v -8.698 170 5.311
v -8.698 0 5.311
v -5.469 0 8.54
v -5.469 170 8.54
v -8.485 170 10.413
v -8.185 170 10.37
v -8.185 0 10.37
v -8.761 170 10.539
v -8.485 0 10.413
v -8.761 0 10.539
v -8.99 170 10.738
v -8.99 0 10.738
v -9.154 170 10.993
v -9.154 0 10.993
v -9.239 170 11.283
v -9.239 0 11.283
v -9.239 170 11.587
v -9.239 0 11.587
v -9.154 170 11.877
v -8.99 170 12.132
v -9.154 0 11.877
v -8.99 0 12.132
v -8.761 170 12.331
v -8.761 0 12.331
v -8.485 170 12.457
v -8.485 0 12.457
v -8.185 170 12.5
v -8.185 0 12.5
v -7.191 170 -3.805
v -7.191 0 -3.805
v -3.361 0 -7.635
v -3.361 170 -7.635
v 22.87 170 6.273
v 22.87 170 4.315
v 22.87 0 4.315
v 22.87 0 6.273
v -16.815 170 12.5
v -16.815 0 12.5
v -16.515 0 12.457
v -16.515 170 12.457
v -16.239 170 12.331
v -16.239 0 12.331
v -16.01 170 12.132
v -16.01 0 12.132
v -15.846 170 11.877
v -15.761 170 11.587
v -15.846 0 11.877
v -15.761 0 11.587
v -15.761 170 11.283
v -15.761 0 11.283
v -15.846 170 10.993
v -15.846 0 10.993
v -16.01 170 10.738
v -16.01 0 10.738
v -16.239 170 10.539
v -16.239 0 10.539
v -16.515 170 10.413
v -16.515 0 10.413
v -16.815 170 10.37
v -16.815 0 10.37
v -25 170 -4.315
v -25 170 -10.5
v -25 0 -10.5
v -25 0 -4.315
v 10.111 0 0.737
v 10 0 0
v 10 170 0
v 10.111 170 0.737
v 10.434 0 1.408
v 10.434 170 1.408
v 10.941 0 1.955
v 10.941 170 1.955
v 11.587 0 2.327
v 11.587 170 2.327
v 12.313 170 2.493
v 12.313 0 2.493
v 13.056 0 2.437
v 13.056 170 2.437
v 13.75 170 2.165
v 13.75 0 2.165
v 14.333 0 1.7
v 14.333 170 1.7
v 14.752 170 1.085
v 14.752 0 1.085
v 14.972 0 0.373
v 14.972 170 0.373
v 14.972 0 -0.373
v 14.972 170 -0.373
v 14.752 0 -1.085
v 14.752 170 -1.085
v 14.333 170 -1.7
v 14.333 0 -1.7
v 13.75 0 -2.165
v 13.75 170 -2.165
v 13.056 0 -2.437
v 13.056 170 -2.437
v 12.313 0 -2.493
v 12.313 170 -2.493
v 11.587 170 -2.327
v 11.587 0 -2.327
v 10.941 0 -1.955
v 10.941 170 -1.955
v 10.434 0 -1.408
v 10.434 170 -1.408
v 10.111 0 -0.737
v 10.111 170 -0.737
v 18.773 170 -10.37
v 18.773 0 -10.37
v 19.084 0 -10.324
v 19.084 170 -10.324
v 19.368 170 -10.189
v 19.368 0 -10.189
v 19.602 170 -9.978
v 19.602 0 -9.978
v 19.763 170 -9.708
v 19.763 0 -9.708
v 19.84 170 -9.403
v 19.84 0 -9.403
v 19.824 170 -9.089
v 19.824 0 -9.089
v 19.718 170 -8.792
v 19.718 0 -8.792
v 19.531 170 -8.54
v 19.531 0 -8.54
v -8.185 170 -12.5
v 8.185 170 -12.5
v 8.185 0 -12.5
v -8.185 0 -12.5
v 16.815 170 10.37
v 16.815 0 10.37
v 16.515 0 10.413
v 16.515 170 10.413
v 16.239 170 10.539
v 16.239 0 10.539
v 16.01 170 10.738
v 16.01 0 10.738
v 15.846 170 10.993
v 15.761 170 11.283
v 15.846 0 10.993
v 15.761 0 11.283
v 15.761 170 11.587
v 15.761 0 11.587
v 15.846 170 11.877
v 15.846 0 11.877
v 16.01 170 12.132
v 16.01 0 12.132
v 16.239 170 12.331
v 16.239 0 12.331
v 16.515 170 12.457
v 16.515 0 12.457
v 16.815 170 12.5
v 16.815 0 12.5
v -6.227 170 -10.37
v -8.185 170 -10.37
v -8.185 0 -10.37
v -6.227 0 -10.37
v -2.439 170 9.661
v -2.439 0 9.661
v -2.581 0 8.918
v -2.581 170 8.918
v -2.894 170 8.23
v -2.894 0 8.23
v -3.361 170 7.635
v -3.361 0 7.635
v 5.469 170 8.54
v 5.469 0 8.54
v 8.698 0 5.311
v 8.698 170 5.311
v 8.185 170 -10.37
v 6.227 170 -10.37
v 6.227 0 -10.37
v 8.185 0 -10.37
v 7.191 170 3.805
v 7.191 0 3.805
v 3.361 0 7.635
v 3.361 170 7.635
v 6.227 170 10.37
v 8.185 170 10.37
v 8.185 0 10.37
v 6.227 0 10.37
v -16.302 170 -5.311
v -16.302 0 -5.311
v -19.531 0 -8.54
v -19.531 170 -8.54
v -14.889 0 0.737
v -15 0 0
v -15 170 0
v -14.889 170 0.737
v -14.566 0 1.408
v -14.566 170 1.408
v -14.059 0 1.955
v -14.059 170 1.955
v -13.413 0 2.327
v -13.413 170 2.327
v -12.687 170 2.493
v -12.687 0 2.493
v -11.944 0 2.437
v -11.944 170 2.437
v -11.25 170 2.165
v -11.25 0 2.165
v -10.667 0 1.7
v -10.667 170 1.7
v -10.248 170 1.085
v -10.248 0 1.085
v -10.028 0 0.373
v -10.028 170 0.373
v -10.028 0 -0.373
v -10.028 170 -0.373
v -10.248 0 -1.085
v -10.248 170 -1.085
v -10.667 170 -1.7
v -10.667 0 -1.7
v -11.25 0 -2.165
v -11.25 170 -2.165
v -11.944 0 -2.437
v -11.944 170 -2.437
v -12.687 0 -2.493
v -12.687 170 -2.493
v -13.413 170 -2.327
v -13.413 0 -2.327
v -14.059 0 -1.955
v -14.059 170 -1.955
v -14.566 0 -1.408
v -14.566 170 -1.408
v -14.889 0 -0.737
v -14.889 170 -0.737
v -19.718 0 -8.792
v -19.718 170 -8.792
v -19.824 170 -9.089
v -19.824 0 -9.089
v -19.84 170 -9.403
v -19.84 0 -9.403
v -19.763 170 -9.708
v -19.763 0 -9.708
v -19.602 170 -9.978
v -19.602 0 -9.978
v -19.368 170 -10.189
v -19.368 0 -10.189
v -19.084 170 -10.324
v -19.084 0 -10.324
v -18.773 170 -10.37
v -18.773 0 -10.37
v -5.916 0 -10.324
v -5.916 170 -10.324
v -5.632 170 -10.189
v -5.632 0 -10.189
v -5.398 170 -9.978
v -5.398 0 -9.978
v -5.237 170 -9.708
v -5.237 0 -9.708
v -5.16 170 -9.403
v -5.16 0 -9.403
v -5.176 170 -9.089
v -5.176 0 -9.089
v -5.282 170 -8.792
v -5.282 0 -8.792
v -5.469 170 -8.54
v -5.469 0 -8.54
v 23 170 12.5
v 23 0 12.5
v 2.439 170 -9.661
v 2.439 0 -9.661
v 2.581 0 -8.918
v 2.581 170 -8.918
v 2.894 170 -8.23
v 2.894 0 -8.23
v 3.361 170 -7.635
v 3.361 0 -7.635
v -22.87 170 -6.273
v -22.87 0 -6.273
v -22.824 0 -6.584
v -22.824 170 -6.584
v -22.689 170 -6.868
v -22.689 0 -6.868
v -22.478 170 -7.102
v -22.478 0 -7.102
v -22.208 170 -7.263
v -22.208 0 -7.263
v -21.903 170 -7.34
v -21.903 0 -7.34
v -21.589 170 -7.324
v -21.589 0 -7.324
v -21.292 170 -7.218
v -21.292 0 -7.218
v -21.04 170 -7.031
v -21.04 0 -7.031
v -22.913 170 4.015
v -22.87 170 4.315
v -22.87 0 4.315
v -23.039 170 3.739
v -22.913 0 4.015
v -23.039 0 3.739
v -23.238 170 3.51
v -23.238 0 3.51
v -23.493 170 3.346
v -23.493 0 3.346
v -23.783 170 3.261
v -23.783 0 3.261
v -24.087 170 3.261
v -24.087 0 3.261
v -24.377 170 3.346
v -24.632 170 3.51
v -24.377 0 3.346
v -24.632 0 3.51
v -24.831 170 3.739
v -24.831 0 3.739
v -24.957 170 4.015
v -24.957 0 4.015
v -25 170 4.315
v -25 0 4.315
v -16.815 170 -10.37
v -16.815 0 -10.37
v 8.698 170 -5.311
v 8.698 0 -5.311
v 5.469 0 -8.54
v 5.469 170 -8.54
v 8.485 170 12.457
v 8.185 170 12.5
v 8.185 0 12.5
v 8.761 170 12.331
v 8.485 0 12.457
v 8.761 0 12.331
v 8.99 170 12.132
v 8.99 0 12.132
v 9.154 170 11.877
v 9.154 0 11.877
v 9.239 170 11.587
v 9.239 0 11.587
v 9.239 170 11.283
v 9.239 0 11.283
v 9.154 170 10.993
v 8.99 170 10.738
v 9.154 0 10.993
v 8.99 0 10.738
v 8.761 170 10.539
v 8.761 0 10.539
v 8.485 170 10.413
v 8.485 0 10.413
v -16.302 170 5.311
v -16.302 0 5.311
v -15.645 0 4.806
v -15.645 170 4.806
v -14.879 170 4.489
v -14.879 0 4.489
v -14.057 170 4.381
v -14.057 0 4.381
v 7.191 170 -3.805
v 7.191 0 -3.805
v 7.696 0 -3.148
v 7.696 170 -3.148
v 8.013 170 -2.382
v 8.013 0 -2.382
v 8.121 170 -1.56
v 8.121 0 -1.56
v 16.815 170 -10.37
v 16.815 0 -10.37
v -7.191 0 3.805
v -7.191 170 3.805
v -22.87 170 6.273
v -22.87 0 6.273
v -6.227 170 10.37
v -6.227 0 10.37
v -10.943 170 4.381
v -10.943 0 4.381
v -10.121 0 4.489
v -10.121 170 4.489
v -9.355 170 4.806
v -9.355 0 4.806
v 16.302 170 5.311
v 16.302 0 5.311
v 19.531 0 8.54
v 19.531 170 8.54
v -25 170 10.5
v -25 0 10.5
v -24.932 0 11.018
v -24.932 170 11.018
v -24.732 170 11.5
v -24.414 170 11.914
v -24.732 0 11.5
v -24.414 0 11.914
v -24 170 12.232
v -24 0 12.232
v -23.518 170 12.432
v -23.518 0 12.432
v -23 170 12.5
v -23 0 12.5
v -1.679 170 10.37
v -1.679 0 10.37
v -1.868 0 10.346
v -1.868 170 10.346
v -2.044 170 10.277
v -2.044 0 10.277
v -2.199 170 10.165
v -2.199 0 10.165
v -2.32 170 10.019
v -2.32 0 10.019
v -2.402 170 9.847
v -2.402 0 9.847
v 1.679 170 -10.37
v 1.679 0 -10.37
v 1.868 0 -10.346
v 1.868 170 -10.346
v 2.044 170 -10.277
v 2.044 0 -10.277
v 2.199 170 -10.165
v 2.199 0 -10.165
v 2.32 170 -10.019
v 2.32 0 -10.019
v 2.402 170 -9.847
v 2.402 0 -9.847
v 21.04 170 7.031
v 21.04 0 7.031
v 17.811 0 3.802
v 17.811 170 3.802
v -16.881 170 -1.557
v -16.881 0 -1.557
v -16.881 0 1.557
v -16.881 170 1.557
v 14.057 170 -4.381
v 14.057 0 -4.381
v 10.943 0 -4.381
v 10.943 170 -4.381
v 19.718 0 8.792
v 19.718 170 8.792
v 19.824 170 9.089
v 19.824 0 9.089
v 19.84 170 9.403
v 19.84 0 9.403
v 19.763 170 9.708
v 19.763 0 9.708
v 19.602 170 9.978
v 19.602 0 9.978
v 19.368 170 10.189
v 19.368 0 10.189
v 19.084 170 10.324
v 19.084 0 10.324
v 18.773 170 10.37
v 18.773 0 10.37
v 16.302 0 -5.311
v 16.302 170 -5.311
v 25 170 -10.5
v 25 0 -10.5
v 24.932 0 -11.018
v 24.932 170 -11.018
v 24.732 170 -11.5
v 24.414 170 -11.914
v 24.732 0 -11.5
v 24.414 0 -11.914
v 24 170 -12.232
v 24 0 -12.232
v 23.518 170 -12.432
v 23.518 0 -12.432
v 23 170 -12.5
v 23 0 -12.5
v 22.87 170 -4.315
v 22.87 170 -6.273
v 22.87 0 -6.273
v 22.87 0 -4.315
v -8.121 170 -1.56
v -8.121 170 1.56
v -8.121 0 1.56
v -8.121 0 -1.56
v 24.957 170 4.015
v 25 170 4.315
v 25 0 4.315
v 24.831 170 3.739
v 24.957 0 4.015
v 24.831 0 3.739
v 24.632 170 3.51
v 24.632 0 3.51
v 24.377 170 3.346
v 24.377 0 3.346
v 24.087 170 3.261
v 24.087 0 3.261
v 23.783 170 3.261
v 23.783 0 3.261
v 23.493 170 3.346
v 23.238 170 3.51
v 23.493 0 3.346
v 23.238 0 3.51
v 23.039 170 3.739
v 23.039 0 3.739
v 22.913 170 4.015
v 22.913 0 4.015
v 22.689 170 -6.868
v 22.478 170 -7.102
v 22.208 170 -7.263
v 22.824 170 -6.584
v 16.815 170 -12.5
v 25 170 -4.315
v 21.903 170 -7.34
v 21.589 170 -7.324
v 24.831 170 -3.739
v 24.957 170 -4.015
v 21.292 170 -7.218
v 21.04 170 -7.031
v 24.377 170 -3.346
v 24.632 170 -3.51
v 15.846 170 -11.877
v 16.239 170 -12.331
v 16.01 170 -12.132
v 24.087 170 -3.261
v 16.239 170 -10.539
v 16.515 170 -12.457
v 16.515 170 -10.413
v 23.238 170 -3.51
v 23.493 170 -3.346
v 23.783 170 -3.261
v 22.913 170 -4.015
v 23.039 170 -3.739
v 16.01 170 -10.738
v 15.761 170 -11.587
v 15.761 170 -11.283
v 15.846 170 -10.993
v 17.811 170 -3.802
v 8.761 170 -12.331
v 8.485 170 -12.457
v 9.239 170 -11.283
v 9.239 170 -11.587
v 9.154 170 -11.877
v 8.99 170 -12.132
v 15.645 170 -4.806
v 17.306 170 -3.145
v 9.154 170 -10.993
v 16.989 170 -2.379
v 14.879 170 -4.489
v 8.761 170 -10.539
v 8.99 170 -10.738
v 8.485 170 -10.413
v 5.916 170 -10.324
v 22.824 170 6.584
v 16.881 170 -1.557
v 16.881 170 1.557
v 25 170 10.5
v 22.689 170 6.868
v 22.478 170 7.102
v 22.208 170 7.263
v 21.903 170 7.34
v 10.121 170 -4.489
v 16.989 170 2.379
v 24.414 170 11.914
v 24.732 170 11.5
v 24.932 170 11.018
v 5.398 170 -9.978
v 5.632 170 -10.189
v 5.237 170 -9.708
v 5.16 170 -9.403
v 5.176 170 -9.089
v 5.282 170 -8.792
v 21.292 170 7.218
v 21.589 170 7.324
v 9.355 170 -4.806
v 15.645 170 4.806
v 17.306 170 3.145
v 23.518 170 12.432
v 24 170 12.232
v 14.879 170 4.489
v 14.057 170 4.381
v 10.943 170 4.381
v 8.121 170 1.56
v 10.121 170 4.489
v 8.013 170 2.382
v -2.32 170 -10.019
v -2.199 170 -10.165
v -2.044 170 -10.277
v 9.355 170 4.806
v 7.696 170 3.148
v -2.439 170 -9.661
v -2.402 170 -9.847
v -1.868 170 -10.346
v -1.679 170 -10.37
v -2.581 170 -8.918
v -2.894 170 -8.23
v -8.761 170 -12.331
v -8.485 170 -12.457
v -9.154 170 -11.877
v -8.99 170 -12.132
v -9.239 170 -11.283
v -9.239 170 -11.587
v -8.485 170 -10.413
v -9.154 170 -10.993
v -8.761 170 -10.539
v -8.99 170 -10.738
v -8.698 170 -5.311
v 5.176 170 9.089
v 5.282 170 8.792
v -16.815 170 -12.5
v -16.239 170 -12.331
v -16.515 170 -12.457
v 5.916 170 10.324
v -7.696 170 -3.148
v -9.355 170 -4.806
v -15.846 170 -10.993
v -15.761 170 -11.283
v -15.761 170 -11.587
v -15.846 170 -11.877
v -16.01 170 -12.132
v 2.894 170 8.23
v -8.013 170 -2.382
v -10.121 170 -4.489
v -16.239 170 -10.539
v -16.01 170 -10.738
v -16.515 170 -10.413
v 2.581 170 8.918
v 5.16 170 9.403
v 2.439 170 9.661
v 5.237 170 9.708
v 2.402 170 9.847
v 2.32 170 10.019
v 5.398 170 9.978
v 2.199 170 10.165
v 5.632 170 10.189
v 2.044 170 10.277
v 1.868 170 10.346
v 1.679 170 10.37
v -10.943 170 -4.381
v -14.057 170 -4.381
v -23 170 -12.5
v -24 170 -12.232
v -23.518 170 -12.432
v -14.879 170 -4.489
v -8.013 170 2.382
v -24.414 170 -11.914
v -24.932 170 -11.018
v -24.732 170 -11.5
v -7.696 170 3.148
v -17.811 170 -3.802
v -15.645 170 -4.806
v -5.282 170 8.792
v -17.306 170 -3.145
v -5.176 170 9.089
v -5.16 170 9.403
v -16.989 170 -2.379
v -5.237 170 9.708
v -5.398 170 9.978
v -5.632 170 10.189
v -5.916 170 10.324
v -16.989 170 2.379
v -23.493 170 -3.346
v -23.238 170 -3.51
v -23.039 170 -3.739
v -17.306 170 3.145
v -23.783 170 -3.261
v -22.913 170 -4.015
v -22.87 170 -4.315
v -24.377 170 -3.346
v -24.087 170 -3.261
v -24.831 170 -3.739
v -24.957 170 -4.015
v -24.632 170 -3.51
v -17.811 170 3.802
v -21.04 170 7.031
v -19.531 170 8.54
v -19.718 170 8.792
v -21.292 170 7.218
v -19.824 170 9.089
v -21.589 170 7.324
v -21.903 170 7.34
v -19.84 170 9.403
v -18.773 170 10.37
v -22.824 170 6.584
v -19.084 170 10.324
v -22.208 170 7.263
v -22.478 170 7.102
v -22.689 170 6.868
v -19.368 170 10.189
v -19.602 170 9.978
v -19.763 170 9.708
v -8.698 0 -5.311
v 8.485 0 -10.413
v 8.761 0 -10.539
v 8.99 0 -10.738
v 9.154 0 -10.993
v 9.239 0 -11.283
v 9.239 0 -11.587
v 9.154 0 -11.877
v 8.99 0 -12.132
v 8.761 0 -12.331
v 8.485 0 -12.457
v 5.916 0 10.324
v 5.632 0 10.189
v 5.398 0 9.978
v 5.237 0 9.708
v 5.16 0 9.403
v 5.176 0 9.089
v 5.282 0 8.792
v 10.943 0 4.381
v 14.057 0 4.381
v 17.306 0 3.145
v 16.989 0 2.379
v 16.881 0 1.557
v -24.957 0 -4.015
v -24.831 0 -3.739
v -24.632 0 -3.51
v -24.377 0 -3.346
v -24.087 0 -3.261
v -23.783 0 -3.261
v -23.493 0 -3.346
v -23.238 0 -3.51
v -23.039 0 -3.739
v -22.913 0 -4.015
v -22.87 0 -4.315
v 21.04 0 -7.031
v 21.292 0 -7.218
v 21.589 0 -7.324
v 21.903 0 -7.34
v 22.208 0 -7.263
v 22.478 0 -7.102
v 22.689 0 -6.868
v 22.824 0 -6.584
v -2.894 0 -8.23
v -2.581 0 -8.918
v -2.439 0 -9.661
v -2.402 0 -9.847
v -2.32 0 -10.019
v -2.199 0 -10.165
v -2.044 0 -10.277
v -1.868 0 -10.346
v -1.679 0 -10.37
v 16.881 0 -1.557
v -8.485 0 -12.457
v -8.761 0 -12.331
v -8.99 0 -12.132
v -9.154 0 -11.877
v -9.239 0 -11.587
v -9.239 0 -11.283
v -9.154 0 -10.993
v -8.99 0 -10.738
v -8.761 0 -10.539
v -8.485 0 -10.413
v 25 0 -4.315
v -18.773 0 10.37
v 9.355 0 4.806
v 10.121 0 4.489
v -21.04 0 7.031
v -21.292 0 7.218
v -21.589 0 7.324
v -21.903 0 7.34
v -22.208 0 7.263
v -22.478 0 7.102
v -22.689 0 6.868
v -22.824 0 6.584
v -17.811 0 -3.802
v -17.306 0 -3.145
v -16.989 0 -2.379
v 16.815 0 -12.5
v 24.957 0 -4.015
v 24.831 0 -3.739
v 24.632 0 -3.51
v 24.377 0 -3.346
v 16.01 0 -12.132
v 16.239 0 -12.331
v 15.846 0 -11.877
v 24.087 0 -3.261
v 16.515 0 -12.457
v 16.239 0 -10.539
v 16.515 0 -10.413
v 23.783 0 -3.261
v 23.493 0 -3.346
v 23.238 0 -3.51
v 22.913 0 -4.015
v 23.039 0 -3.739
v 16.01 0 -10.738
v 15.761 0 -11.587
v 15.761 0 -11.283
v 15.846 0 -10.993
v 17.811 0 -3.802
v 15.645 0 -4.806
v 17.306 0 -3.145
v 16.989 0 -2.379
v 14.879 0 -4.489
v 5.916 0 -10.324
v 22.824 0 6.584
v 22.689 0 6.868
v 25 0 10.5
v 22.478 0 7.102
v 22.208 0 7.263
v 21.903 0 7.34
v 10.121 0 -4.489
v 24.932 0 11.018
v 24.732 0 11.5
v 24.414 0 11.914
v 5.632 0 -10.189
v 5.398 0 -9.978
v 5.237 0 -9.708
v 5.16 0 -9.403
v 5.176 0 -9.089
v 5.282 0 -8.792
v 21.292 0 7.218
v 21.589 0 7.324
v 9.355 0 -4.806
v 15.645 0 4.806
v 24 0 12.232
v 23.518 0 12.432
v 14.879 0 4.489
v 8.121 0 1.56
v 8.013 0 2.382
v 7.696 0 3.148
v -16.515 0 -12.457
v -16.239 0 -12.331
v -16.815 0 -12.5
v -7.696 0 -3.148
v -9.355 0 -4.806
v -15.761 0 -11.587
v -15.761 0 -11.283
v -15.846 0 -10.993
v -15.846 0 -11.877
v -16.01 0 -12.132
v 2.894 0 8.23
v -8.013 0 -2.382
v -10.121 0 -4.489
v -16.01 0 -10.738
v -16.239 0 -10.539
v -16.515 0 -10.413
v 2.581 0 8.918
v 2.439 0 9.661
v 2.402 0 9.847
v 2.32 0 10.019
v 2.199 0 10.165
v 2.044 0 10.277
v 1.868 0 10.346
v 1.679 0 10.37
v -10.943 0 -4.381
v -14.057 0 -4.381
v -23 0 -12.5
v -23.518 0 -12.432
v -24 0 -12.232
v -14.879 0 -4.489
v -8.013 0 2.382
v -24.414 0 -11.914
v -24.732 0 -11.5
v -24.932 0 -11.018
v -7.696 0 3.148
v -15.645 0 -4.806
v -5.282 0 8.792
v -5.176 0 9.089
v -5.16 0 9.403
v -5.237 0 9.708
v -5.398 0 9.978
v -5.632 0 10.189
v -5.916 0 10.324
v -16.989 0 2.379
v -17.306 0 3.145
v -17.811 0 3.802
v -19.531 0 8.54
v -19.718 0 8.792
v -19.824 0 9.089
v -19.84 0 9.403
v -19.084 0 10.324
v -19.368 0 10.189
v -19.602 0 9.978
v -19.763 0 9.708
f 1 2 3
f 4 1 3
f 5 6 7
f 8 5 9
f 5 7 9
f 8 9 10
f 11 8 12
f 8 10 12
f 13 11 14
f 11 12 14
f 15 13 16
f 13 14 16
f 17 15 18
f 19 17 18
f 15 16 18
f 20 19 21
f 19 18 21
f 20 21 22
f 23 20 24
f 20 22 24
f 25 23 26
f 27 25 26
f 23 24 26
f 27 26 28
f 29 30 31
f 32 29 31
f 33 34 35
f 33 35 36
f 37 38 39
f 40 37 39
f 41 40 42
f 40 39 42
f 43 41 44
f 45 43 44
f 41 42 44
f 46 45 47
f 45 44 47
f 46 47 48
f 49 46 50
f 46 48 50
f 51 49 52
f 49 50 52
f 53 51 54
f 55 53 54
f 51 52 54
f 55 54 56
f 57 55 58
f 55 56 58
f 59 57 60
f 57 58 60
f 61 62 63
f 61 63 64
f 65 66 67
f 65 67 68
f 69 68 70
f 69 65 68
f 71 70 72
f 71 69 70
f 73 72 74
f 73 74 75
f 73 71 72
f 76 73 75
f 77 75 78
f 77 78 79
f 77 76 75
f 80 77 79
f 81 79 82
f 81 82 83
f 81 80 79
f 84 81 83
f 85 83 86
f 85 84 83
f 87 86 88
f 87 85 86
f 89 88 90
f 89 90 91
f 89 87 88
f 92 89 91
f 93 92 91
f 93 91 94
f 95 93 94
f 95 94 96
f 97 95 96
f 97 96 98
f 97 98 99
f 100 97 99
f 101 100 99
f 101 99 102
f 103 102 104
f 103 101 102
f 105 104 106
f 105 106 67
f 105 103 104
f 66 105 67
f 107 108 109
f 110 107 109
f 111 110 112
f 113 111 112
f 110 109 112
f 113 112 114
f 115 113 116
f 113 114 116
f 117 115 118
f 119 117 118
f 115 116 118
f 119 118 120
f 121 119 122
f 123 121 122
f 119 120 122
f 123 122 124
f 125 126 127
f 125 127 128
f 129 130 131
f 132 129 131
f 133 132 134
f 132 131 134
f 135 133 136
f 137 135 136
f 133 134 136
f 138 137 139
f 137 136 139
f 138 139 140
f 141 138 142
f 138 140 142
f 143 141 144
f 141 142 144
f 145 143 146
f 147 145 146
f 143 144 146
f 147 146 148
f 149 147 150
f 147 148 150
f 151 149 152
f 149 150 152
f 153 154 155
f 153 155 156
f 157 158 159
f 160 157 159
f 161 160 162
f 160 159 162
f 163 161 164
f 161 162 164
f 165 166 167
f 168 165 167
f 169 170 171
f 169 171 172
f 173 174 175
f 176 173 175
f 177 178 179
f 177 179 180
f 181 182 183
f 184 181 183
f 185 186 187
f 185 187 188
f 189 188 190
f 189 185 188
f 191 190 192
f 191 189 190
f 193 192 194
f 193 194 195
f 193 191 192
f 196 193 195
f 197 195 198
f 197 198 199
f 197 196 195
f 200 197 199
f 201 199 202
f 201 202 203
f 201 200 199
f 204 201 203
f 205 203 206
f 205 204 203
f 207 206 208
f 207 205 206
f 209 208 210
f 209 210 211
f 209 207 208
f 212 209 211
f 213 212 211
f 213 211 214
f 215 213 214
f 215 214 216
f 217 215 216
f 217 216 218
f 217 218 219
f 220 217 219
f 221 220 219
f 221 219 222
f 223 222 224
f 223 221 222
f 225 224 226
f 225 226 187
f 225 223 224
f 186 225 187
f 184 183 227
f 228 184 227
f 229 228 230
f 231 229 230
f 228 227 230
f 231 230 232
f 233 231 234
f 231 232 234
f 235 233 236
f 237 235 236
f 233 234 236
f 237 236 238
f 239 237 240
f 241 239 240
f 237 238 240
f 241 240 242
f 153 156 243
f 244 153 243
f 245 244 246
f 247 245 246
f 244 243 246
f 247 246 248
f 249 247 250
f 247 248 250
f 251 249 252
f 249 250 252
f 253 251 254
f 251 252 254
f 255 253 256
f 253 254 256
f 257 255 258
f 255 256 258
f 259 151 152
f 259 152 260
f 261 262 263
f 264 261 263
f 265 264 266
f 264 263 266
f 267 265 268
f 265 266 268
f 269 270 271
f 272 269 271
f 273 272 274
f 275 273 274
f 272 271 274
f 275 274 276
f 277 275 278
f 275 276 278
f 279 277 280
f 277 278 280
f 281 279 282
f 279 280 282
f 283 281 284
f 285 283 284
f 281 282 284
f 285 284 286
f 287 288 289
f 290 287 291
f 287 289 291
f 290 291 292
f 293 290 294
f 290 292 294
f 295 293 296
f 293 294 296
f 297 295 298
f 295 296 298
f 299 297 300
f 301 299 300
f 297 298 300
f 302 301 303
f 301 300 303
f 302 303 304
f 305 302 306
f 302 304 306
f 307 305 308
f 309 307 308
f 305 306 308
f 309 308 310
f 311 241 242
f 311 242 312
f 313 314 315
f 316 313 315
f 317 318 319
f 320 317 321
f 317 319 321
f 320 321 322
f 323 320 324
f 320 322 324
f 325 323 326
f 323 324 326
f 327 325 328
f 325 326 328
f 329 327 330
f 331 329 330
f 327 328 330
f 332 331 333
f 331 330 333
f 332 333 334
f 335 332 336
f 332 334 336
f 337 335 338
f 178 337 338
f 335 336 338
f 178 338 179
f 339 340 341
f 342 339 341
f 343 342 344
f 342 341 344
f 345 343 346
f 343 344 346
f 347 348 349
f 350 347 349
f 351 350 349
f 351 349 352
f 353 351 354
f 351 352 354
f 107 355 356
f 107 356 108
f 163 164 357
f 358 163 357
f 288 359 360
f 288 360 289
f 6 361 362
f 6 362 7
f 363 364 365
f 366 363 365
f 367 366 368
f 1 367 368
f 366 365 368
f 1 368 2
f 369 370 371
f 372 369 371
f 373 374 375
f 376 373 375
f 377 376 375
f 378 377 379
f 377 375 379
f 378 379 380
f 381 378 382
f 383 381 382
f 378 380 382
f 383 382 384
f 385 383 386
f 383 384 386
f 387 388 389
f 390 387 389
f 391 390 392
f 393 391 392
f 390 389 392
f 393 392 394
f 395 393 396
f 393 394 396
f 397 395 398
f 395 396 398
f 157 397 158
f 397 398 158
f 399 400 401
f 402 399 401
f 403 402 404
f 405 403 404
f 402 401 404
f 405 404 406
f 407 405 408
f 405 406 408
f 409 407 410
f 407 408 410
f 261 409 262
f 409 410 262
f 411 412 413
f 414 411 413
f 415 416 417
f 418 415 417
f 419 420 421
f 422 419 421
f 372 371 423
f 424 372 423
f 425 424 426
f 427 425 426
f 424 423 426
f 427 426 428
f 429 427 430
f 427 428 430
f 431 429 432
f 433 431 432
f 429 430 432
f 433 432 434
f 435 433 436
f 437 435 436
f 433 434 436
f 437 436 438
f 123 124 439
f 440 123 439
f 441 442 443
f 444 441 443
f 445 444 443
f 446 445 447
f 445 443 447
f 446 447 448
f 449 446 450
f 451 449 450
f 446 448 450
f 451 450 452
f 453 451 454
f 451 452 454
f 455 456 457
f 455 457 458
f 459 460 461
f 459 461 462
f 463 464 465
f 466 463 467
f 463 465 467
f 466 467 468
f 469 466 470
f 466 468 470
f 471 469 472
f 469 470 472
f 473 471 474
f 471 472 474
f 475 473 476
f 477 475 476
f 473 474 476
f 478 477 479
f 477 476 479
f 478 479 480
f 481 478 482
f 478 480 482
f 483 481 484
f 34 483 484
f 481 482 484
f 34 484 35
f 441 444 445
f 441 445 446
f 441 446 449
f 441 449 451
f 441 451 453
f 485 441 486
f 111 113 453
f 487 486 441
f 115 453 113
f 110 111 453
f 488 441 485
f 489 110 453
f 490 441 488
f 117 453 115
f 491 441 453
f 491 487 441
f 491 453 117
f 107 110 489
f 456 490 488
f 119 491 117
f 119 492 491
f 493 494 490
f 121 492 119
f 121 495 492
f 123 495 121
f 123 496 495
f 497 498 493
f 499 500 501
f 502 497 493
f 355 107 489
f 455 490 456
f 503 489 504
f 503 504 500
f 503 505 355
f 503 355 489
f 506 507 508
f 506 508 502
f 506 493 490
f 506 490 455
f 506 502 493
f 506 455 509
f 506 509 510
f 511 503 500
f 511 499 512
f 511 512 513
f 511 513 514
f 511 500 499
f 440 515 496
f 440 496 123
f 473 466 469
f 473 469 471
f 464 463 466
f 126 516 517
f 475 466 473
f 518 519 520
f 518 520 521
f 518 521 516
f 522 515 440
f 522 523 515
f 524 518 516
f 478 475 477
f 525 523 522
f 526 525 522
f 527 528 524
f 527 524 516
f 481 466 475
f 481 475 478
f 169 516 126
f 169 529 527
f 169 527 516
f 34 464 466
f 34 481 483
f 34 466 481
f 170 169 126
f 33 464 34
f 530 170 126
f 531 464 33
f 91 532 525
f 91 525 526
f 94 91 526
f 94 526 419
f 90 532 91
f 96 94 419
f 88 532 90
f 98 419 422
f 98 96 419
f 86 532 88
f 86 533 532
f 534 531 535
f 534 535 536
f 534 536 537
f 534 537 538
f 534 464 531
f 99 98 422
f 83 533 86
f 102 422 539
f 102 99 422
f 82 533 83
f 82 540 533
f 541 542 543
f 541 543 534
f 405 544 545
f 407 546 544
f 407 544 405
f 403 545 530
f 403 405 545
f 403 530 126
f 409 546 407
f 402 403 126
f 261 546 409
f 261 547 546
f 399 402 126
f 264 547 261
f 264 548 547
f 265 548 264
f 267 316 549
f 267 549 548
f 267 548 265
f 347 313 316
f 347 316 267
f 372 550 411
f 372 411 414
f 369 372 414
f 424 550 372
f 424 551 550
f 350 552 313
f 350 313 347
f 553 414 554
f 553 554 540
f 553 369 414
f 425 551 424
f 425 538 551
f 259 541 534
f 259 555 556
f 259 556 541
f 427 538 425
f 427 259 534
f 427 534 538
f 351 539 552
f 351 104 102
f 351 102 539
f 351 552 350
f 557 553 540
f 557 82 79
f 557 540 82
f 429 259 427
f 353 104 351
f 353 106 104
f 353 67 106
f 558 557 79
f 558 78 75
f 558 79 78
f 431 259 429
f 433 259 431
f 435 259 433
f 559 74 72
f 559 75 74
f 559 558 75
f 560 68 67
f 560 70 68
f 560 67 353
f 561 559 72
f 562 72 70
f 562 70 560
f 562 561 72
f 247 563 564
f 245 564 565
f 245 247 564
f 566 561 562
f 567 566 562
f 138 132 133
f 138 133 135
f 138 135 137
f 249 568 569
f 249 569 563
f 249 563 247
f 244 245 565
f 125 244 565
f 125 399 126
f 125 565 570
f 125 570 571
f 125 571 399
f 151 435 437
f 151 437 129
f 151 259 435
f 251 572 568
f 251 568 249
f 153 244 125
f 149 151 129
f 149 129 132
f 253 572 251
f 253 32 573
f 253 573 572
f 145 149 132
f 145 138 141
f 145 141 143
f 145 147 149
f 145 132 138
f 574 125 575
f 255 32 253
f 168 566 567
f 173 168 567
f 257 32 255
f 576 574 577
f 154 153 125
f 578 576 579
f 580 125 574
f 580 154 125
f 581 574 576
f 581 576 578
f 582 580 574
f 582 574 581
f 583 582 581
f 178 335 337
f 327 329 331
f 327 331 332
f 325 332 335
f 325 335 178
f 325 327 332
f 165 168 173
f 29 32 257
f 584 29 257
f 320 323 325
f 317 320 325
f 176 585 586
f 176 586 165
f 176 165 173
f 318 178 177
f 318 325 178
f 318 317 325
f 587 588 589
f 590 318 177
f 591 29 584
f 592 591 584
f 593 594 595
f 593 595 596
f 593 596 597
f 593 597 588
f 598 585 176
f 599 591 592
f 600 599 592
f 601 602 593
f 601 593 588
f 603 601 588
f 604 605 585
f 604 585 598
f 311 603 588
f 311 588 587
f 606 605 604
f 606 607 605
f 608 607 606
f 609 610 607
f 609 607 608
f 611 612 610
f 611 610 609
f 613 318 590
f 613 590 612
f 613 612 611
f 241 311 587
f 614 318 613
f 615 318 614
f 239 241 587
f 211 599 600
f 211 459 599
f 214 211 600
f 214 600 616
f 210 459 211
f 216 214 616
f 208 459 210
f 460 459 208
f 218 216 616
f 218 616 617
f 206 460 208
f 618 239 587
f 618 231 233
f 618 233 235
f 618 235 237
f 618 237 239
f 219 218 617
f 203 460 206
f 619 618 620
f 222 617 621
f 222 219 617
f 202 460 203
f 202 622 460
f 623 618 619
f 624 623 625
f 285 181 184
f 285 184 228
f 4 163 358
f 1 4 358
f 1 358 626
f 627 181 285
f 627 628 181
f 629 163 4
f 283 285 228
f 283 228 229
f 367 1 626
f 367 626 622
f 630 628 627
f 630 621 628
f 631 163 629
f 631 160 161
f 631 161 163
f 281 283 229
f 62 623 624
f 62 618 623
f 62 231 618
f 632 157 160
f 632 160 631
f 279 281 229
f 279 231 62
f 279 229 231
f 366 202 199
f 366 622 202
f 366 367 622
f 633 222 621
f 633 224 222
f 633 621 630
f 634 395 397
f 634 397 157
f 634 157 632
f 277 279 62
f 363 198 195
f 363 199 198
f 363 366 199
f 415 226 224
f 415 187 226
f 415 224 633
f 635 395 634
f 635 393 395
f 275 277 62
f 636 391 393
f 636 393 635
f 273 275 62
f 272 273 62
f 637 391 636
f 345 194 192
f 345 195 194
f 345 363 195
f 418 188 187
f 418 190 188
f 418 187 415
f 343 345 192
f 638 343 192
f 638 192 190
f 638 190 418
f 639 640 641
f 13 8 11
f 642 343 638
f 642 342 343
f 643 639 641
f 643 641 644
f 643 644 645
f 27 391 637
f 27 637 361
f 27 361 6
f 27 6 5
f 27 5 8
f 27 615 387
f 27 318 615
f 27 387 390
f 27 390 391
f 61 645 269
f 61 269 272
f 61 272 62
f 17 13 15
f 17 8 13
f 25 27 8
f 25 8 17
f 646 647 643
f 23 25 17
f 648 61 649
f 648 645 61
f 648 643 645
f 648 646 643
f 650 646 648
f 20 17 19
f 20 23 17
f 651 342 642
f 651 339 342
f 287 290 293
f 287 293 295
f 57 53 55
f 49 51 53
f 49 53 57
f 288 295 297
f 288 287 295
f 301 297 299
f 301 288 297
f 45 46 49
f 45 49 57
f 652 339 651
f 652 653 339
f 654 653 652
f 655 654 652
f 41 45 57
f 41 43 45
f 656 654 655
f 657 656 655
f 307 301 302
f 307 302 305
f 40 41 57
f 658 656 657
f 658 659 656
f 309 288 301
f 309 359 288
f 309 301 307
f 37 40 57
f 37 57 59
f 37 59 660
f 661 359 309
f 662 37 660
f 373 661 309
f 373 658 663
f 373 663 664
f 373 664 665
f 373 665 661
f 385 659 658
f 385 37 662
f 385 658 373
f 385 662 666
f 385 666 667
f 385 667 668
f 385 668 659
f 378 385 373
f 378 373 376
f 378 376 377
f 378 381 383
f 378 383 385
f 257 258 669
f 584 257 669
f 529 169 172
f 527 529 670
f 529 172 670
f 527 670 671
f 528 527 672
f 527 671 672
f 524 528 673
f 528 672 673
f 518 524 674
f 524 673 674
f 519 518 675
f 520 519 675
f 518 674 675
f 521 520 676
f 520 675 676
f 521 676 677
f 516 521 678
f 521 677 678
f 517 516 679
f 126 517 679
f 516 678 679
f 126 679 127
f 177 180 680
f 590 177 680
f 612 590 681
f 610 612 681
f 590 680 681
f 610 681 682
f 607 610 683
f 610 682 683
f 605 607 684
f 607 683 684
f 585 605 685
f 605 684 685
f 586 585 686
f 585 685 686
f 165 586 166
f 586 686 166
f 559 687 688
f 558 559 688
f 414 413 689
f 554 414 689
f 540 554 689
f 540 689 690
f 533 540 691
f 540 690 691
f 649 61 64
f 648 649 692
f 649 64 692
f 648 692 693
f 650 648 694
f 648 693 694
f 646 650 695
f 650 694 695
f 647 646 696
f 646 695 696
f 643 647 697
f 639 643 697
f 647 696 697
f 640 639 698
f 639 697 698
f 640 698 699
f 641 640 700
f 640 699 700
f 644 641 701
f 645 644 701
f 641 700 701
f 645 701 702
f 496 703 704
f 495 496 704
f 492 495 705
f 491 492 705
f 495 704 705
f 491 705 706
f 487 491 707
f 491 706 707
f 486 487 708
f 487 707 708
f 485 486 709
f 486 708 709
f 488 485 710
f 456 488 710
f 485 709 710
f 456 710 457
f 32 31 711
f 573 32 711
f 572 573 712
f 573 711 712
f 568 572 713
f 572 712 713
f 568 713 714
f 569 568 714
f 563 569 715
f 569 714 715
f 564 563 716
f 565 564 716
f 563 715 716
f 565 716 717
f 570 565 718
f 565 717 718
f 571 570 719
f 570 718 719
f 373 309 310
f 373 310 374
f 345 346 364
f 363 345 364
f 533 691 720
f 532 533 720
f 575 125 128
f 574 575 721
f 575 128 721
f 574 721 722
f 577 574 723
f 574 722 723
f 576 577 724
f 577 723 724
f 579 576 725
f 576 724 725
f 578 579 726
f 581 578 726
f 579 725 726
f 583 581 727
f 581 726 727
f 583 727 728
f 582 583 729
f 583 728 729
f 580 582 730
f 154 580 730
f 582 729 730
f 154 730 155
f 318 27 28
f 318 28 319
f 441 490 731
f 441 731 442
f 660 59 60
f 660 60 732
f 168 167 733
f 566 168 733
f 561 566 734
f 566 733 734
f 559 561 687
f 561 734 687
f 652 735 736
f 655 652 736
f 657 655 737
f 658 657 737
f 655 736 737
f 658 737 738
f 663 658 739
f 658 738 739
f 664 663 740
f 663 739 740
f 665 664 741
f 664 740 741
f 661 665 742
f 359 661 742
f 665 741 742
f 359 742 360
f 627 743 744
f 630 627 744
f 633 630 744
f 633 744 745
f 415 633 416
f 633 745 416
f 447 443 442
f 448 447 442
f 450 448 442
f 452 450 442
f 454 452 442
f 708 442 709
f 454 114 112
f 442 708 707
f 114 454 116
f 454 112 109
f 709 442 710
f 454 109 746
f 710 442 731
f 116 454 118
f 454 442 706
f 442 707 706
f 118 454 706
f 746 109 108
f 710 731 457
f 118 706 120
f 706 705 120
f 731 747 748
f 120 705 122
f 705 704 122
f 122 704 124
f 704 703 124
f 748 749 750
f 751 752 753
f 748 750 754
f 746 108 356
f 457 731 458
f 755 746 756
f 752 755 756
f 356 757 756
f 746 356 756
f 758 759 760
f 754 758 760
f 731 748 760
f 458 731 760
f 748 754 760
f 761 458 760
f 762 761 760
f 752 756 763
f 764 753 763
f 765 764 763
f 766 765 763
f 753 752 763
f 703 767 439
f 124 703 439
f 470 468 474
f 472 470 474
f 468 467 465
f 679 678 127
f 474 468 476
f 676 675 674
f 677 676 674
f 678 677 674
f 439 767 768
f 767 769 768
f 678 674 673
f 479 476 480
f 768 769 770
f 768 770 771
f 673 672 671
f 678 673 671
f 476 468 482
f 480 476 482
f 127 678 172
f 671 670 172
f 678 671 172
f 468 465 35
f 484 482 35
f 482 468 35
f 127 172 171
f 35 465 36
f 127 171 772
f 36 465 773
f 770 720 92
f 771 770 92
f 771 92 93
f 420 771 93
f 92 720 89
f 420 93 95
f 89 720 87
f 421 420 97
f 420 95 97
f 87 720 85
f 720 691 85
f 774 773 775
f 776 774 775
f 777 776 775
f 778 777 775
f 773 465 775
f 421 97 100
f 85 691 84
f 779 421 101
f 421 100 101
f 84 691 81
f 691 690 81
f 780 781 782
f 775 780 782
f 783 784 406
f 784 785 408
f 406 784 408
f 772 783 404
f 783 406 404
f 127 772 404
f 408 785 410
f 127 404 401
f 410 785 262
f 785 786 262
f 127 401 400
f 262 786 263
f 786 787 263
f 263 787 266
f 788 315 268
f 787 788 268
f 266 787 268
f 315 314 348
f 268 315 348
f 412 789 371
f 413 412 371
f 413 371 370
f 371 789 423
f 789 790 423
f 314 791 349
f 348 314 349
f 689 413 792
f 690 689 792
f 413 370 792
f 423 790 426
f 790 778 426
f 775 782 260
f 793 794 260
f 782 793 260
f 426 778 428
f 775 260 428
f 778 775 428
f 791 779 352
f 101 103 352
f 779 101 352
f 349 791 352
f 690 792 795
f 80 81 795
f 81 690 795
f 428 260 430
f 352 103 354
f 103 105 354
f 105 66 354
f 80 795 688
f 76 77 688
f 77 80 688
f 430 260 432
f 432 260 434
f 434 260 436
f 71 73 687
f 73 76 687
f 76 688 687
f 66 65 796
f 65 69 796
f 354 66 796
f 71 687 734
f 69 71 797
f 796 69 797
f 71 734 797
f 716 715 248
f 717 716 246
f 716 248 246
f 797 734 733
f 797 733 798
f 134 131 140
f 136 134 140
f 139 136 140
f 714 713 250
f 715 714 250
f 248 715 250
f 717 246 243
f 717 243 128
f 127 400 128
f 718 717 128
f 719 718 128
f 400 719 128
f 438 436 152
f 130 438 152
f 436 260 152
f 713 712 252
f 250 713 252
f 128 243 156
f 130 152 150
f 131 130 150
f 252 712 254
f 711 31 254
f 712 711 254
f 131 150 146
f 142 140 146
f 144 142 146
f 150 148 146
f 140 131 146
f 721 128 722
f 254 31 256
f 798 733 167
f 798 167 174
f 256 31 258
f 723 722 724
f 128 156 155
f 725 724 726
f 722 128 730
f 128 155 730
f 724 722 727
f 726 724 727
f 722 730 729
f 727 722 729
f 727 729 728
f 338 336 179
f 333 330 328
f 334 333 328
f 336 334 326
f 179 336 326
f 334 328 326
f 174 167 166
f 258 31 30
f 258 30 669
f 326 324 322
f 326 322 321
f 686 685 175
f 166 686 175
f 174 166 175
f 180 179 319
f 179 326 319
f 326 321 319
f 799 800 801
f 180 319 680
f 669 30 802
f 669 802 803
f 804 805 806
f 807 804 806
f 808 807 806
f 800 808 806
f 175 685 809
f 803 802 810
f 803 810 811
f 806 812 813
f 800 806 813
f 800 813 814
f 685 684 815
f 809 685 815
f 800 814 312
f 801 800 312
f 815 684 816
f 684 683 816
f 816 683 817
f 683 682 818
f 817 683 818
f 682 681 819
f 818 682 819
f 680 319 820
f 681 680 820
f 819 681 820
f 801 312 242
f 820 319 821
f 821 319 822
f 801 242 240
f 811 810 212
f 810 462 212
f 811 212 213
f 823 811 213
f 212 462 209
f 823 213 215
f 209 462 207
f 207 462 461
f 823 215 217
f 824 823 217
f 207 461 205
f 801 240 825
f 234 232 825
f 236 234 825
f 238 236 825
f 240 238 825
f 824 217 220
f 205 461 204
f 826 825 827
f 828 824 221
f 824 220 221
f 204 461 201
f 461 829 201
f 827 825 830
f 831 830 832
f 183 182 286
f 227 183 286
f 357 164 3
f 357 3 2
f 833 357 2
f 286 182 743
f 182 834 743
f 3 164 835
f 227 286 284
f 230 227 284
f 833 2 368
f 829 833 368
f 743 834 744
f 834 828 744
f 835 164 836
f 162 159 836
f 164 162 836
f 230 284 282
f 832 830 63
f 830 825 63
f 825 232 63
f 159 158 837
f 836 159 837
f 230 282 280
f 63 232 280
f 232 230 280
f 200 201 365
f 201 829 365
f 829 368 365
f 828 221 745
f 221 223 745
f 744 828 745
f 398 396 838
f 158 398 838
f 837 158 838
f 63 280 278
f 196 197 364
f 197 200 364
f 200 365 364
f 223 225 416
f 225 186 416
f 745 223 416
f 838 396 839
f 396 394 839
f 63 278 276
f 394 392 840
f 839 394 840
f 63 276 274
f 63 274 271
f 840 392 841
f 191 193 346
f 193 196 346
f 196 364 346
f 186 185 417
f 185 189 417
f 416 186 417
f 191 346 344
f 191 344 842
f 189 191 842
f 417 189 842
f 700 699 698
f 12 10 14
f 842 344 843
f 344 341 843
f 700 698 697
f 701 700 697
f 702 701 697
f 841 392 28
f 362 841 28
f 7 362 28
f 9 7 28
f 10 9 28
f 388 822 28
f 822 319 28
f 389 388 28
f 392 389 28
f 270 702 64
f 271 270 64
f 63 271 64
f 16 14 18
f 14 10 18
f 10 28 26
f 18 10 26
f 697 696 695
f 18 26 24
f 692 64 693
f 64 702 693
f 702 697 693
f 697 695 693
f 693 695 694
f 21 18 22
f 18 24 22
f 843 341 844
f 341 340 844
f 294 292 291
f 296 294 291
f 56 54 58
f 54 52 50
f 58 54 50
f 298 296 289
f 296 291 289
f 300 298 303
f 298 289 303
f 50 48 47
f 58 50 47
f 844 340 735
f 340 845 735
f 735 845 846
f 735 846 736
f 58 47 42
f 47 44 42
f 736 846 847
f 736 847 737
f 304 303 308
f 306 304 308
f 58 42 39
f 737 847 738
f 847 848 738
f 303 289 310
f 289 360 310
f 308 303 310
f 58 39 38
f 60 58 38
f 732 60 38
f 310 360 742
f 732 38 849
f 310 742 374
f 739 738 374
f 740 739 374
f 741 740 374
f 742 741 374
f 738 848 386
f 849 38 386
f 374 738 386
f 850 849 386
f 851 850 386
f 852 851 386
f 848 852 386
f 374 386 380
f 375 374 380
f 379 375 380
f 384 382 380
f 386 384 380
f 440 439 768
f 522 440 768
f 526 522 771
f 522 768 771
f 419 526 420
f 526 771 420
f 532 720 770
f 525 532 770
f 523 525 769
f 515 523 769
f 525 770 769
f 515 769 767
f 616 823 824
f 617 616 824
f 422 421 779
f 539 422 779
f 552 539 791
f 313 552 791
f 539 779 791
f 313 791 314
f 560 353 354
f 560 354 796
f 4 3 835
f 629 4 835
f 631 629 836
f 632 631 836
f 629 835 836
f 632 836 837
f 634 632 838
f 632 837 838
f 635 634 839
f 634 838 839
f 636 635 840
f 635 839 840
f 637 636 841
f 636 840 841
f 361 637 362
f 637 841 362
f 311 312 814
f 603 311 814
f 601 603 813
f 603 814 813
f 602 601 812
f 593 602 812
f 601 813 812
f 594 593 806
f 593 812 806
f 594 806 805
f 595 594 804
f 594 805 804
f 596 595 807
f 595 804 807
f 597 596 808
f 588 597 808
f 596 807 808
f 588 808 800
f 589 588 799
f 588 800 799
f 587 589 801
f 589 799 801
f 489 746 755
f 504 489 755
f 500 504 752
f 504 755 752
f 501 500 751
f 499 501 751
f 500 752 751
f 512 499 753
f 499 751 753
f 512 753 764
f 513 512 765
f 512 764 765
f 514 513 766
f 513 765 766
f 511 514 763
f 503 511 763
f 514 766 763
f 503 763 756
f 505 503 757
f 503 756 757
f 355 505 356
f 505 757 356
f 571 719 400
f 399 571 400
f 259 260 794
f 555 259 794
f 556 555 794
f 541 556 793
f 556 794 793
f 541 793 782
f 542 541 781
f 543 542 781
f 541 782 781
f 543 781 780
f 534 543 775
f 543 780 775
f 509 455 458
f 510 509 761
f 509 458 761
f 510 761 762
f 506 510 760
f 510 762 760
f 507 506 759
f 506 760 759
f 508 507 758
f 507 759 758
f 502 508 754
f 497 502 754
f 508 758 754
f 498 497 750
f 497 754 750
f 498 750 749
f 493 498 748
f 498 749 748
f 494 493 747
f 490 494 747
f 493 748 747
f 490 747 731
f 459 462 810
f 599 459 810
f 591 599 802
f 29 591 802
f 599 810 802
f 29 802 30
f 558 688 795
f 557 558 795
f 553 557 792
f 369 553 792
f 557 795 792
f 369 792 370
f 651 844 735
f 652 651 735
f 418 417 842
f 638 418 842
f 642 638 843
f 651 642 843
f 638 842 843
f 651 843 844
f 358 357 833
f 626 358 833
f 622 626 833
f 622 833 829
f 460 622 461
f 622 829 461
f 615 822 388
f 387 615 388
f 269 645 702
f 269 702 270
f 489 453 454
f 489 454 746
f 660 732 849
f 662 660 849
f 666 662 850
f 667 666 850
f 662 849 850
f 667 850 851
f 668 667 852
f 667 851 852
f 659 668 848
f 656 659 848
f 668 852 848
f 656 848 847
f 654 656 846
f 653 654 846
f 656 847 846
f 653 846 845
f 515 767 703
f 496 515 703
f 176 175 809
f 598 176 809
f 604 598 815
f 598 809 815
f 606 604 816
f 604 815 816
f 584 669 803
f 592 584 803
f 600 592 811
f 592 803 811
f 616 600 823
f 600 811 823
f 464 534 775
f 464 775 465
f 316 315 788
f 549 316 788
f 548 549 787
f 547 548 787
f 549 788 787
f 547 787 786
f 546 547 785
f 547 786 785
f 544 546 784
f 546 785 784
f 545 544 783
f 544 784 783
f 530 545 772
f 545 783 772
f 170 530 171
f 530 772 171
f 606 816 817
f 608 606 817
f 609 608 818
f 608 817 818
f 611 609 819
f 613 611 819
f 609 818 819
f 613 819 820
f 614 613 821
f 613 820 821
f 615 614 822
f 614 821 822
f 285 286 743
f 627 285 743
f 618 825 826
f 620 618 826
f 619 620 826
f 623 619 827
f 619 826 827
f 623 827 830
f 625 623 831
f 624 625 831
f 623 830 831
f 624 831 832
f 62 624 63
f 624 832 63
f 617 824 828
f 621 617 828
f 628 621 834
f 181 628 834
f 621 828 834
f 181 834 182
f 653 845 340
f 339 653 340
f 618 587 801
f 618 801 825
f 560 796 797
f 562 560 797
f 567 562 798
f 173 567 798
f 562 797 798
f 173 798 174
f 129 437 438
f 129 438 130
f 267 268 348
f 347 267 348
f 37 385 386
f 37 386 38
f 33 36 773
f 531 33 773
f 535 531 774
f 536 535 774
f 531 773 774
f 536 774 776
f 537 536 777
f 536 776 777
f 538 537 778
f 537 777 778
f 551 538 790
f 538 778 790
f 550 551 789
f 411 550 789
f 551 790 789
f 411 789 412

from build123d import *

# Parameters (mm, degrees)
SKETCH11_R                             = 2.5
F_25_SERIES_EXTRUSIONS_25_2550_1_DEPTH = 170


with BuildPart() as part:
    # Sketch11 → 25 series extrusions 25-2550(1) (new body)
    with BuildSketch(Plane(origin=(0, 0, 0), x_dir=(-1, 0, 0), z_dir=(0, 1, 0))):
        with BuildLine():
            Line((8.185, 12.5), (-8.185, 12.5))
            ThreePointArc((-8.185, 12.5), (-9.25, 11.435), (-8.185, 10.37))
            Line((-8.185, 10.37), (-6.227198013, 10.37))
            ThreePointArc((-6.227198013, 10.37), (-5.236616214, 9.708114403), (-5.469039527, 8.539643501))
            Line((-5.469039527, 8.539643501), (-8.697639148, 5.311043881))
            ThreePointArc((-8.697639148, 5.311043881), (-9.72768328, 4.622790395), (-10.942703178, 4.381107911))
            Line((-10.942703178, 4.381107911), (-14.057296822, 4.381107911))
            ThreePointArc((-14.057296822, 4.381107911), (-15.27231672, 4.622790395), (-16.302360852, 5.311043881))
            Line((-16.302360852, 5.311043881), (-19.530960473, 8.539643501))
            ThreePointArc((-19.530960473, 8.539643501), (-19.763383786, 9.708114403), (-18.772801987, 10.37))
            Line((-18.772801987, 10.37), (-16.815, 10.37))
            ThreePointArc((-16.815, 10.37), (-15.75, 11.435), (-16.815, 12.5))
            Line((-16.815, 12.5), (-23, 12.5))
            ThreePointArc((-23, 12.5), (-24.414213562, 11.914213562), (-25, 10.5))
            Line((-25, 10.5), (-25, 4.315))
            ThreePointArc((-25, 4.315), (-23.935, 3.25), (-22.87, 4.315))
            Line((-22.87, 4.315), (-22.87, 6.272801987))
            ThreePointArc((-22.87, 6.272801987), (-22.208114403, 7.263383786), (-21.039643501, 7.030960473))
            Line((-21.039643501, 7.030960473), (-17.811043881, 3.802360852))
            ThreePointArc((-17.811043881, 3.802360852), (-17.122790395, 2.77231672), (-16.881107911, 1.557296822))
            Line((-16.881107911, 1.557296822), (-16.881107911, -1.557296822))
            ThreePointArc((-16.881107911, -1.557296822), (-17.122790395, -2.77231672), (-17.811043881, -3.802360852))
            Line((-17.811043881, -3.802360852), (-21.039643501, -7.030960473))
            ThreePointArc((-21.039643501, -7.030960473), (-22.208114403, -7.263383786), (-22.87, -6.272801987))
            Line((-22.87, -6.272801987), (-22.87, -4.315))
            ThreePointArc((-22.87, -4.315), (-23.935, -3.25), (-25, -4.315))
            Line((-25, -4.315), (-25, -10.5))
            ThreePointArc((-25, -10.5), (-24.414213562, -11.914213562), (-23, -12.5))
            Line((-23, -12.5), (-16.815, -12.5))
            ThreePointArc((-16.815, -12.5), (-15.75, -11.435), (-16.815, -10.37))
            Line((-16.815, -10.37), (-18.772801987, -10.37))
            ThreePointArc((-18.772801987, -10.37), (-19.763383786, -9.708114403), (-19.530960473, -8.539643501))
            Line((-19.530960473, -8.539643501), (-16.302360852, -5.311043881))
            ThreePointArc((-16.302360852, -5.311043881), (-15.27231672, -4.622790395), (-14.057296822, -4.381107911))
            Line((-14.057296822, -4.381107911), (-10.942703178, -4.381107911))
            ThreePointArc((-10.942703178, -4.381107911), (-9.72768328, -4.622790395), (-8.697639148, -5.311043881))
            Line((-8.697639148, -5.311043881), (-5.469039527, -8.539643501))
            ThreePointArc((-5.469039527, -8.539643501), (-5.236616214, -9.708114403), (-6.227198013, -10.37))
            Line((-6.227198013, -10.37), (-8.185, -10.37))
            ThreePointArc((-8.185, -10.37), (-9.25, -11.435), (-8.185, -12.5))
            Line((-8.185, -12.5), (8.185, -12.5))
            ThreePointArc((8.185, -12.5), (9.25, -11.435), (8.185, -10.37))
            Line((8.185, -10.37), (6.227198013, -10.37))
            ThreePointArc((6.227198013, -10.37), (5.236616214, -9.708114403), (5.469039527, -8.539643501))
            Line((5.469039527, -8.539643501), (8.697639148, -5.311043881))
            ThreePointArc((8.697639148, -5.311043881), (9.72768328, -4.622790395), (10.942703178, -4.381107911))
            Line((10.942703178, -4.381107911), (14.057296822, -4.381107911))
            ThreePointArc((14.057296822, -4.381107911), (15.27231672, -4.622790395), (16.302360852, -5.311043881))
            Line((16.302360852, -5.311043881), (19.530960473, -8.539643501))
            ThreePointArc((19.530960473, -8.539643501), (19.763383786, -9.708114403), (18.772801987, -10.37))
            Line((18.772801987, -10.37), (16.815, -10.37))
            ThreePointArc((16.815, -10.37), (15.75, -11.435), (16.815, -12.5))
            Line((16.815, -12.5), (23, -12.5))
            ThreePointArc((23, -12.5), (24.414213562, -11.914213562), (25, -10.5))
            Line((25, -10.5), (25, -4.315))
            ThreePointArc((25, -4.315), (23.935, -3.25), (22.87, -4.315))
            Line((22.87, -4.315), (22.87, -6.272801987))
            ThreePointArc((22.87, -6.272801987), (22.208114403, -7.263383786), (21.039643501, -7.030960473))
            Line((21.039643501, -7.030960473), (17.811043881, -3.802360852))
            ThreePointArc((17.811043881, -3.802360852), (17.122790395, -2.77231672), (16.881107911, -1.557296822))
            Line((16.881107911, -1.557296822), (16.881107911, 1.557296822))
            ThreePointArc((16.881107911, 1.557296822), (17.122790395, 2.77231672), (17.811043881, 3.802360852))
            Line((17.811043881, 3.802360852), (21.039643501, 7.030960473))
            ThreePointArc((21.039643501, 7.030960473), (22.208114403, 7.263383786), (22.87, 6.272801987))
            Line((22.87, 6.272801987), (22.87, 4.315))
            ThreePointArc((22.87, 4.315), (23.935, 3.25), (25, 4.315))
            Line((25, 4.315), (25, 10.5))
            ThreePointArc((25, 10.5), (24.414213562, 11.914213562), (23, 12.5))
            Line((23, 12.5), (16.815, 12.5))
            ThreePointArc((16.815, 12.5), (15.75, 11.435), (16.815, 10.37))
            Line((16.815, 10.37), (18.772801987, 10.37))
            ThreePointArc((18.772801987, 10.37), (19.763383786, 9.708114403), (19.530960473, 8.539643501))
            Line((19.530960473, 8.539643501), (16.302360852, 5.311043881))
            ThreePointArc((16.302360852, 5.311043881), (15.27231672, 4.622790395), (14.057296822, 4.381107911))
            Line((14.057296822, 4.381107911), (10.942703178, 4.381107911))
            ThreePointArc((10.942703178, 4.381107911), (9.72768328, 4.622790395), (8.697639148, 5.311043881))
            Line((8.697639148, 5.311043881), (5.469039527, 8.539643501))
            ThreePointArc((5.469039527, 8.539643501), (5.236616214, 9.708114403), (6.227198013, 10.37))
            Line((6.227198013, 10.37), (8.185, 10.37))
            ThreePointArc((8.185, 10.37), (9.25, 11.435), (8.185, 12.5))
        make_face()
        with Locations((-12.5, 0)):
            Circle(SKETCH11_R, mode=Mode.SUBTRACT)
        with Locations((12.5, 0)):
            Circle(SKETCH11_R, mode=Mode.SUBTRACT)
        with BuildLine():
            Line((-1.678781255, 10.37), (1.678781255, 10.37))
            ThreePointArc((1.678781255, 10.37), (2.198638297, 10.16512894), (2.438958165, 9.660678886))
            ThreePointArc((2.438958165, 9.660678886), (2.716823224, 8.564426963), (3.361297928, 7.635110212))
            Line((3.361297928, 7.635110212), (7.191171941, 3.805236199))
            ThreePointArc((7.191171941, 3.805236199), (7.879425427, 2.775192067), (8.121107911, 1.560172169))
            Line((8.121107911, 1.560172169), (8.121107911, -1.560172169))
            ThreePointArc((8.121107911, -1.560172169), (7.879425427, -2.775192067), (7.191171941, -3.805236199))
            Line((7.191171941, -3.805236199), (3.361297928, -7.635110212))
            ThreePointArc((3.361297928, -7.635110212), (2.716823224, -8.564426963), (2.438958165, -9.660678886))
            ThreePointArc((2.438958165, -9.660678886), (2.198638297, -10.16512894), (1.678781255, -10.37))
            Line((1.678781255, -10.37), (-1.678781255, -10.37))
            ThreePointArc((-1.678781255, -10.37), (-2.198638297, -10.16512894), (-2.438958165, -9.660678886))
            ThreePointArc((-2.438958165, -9.660678886), (-2.716823224, -8.564426963), (-3.361297928, -7.635110212))
            Line((-3.361297928, -7.635110212), (-7.191171941, -3.805236199))
            ThreePointArc((-7.191171941, -3.805236199), (-7.879425427, -2.775192067), (-8.121107911, -1.560172169))
            Line((-8.121107911, -1.560172169), (-8.121107911, 1.560172169))
            ThreePointArc((-8.121107911, 1.560172169), (-7.879425427, 2.775192067), (-7.191171941, 3.805236199))
            Line((-7.191171941, 3.805236199), (-3.361297928, 7.635110212))
            ThreePointArc((-3.361297928, 7.635110212), (-2.716823224, 8.564426963), (-2.438958165, 9.660678886))
            ThreePointArc((-2.438958165, 9.660678886), (-2.198638297, 10.16512894), (-1.678781255, 10.37))
        make_face(mode=Mode.SUBTRACT)
    extrude(amount=F_25_SERIES_EXTRUSIONS_25_2550_1_DEPTH)


solid = part.part
